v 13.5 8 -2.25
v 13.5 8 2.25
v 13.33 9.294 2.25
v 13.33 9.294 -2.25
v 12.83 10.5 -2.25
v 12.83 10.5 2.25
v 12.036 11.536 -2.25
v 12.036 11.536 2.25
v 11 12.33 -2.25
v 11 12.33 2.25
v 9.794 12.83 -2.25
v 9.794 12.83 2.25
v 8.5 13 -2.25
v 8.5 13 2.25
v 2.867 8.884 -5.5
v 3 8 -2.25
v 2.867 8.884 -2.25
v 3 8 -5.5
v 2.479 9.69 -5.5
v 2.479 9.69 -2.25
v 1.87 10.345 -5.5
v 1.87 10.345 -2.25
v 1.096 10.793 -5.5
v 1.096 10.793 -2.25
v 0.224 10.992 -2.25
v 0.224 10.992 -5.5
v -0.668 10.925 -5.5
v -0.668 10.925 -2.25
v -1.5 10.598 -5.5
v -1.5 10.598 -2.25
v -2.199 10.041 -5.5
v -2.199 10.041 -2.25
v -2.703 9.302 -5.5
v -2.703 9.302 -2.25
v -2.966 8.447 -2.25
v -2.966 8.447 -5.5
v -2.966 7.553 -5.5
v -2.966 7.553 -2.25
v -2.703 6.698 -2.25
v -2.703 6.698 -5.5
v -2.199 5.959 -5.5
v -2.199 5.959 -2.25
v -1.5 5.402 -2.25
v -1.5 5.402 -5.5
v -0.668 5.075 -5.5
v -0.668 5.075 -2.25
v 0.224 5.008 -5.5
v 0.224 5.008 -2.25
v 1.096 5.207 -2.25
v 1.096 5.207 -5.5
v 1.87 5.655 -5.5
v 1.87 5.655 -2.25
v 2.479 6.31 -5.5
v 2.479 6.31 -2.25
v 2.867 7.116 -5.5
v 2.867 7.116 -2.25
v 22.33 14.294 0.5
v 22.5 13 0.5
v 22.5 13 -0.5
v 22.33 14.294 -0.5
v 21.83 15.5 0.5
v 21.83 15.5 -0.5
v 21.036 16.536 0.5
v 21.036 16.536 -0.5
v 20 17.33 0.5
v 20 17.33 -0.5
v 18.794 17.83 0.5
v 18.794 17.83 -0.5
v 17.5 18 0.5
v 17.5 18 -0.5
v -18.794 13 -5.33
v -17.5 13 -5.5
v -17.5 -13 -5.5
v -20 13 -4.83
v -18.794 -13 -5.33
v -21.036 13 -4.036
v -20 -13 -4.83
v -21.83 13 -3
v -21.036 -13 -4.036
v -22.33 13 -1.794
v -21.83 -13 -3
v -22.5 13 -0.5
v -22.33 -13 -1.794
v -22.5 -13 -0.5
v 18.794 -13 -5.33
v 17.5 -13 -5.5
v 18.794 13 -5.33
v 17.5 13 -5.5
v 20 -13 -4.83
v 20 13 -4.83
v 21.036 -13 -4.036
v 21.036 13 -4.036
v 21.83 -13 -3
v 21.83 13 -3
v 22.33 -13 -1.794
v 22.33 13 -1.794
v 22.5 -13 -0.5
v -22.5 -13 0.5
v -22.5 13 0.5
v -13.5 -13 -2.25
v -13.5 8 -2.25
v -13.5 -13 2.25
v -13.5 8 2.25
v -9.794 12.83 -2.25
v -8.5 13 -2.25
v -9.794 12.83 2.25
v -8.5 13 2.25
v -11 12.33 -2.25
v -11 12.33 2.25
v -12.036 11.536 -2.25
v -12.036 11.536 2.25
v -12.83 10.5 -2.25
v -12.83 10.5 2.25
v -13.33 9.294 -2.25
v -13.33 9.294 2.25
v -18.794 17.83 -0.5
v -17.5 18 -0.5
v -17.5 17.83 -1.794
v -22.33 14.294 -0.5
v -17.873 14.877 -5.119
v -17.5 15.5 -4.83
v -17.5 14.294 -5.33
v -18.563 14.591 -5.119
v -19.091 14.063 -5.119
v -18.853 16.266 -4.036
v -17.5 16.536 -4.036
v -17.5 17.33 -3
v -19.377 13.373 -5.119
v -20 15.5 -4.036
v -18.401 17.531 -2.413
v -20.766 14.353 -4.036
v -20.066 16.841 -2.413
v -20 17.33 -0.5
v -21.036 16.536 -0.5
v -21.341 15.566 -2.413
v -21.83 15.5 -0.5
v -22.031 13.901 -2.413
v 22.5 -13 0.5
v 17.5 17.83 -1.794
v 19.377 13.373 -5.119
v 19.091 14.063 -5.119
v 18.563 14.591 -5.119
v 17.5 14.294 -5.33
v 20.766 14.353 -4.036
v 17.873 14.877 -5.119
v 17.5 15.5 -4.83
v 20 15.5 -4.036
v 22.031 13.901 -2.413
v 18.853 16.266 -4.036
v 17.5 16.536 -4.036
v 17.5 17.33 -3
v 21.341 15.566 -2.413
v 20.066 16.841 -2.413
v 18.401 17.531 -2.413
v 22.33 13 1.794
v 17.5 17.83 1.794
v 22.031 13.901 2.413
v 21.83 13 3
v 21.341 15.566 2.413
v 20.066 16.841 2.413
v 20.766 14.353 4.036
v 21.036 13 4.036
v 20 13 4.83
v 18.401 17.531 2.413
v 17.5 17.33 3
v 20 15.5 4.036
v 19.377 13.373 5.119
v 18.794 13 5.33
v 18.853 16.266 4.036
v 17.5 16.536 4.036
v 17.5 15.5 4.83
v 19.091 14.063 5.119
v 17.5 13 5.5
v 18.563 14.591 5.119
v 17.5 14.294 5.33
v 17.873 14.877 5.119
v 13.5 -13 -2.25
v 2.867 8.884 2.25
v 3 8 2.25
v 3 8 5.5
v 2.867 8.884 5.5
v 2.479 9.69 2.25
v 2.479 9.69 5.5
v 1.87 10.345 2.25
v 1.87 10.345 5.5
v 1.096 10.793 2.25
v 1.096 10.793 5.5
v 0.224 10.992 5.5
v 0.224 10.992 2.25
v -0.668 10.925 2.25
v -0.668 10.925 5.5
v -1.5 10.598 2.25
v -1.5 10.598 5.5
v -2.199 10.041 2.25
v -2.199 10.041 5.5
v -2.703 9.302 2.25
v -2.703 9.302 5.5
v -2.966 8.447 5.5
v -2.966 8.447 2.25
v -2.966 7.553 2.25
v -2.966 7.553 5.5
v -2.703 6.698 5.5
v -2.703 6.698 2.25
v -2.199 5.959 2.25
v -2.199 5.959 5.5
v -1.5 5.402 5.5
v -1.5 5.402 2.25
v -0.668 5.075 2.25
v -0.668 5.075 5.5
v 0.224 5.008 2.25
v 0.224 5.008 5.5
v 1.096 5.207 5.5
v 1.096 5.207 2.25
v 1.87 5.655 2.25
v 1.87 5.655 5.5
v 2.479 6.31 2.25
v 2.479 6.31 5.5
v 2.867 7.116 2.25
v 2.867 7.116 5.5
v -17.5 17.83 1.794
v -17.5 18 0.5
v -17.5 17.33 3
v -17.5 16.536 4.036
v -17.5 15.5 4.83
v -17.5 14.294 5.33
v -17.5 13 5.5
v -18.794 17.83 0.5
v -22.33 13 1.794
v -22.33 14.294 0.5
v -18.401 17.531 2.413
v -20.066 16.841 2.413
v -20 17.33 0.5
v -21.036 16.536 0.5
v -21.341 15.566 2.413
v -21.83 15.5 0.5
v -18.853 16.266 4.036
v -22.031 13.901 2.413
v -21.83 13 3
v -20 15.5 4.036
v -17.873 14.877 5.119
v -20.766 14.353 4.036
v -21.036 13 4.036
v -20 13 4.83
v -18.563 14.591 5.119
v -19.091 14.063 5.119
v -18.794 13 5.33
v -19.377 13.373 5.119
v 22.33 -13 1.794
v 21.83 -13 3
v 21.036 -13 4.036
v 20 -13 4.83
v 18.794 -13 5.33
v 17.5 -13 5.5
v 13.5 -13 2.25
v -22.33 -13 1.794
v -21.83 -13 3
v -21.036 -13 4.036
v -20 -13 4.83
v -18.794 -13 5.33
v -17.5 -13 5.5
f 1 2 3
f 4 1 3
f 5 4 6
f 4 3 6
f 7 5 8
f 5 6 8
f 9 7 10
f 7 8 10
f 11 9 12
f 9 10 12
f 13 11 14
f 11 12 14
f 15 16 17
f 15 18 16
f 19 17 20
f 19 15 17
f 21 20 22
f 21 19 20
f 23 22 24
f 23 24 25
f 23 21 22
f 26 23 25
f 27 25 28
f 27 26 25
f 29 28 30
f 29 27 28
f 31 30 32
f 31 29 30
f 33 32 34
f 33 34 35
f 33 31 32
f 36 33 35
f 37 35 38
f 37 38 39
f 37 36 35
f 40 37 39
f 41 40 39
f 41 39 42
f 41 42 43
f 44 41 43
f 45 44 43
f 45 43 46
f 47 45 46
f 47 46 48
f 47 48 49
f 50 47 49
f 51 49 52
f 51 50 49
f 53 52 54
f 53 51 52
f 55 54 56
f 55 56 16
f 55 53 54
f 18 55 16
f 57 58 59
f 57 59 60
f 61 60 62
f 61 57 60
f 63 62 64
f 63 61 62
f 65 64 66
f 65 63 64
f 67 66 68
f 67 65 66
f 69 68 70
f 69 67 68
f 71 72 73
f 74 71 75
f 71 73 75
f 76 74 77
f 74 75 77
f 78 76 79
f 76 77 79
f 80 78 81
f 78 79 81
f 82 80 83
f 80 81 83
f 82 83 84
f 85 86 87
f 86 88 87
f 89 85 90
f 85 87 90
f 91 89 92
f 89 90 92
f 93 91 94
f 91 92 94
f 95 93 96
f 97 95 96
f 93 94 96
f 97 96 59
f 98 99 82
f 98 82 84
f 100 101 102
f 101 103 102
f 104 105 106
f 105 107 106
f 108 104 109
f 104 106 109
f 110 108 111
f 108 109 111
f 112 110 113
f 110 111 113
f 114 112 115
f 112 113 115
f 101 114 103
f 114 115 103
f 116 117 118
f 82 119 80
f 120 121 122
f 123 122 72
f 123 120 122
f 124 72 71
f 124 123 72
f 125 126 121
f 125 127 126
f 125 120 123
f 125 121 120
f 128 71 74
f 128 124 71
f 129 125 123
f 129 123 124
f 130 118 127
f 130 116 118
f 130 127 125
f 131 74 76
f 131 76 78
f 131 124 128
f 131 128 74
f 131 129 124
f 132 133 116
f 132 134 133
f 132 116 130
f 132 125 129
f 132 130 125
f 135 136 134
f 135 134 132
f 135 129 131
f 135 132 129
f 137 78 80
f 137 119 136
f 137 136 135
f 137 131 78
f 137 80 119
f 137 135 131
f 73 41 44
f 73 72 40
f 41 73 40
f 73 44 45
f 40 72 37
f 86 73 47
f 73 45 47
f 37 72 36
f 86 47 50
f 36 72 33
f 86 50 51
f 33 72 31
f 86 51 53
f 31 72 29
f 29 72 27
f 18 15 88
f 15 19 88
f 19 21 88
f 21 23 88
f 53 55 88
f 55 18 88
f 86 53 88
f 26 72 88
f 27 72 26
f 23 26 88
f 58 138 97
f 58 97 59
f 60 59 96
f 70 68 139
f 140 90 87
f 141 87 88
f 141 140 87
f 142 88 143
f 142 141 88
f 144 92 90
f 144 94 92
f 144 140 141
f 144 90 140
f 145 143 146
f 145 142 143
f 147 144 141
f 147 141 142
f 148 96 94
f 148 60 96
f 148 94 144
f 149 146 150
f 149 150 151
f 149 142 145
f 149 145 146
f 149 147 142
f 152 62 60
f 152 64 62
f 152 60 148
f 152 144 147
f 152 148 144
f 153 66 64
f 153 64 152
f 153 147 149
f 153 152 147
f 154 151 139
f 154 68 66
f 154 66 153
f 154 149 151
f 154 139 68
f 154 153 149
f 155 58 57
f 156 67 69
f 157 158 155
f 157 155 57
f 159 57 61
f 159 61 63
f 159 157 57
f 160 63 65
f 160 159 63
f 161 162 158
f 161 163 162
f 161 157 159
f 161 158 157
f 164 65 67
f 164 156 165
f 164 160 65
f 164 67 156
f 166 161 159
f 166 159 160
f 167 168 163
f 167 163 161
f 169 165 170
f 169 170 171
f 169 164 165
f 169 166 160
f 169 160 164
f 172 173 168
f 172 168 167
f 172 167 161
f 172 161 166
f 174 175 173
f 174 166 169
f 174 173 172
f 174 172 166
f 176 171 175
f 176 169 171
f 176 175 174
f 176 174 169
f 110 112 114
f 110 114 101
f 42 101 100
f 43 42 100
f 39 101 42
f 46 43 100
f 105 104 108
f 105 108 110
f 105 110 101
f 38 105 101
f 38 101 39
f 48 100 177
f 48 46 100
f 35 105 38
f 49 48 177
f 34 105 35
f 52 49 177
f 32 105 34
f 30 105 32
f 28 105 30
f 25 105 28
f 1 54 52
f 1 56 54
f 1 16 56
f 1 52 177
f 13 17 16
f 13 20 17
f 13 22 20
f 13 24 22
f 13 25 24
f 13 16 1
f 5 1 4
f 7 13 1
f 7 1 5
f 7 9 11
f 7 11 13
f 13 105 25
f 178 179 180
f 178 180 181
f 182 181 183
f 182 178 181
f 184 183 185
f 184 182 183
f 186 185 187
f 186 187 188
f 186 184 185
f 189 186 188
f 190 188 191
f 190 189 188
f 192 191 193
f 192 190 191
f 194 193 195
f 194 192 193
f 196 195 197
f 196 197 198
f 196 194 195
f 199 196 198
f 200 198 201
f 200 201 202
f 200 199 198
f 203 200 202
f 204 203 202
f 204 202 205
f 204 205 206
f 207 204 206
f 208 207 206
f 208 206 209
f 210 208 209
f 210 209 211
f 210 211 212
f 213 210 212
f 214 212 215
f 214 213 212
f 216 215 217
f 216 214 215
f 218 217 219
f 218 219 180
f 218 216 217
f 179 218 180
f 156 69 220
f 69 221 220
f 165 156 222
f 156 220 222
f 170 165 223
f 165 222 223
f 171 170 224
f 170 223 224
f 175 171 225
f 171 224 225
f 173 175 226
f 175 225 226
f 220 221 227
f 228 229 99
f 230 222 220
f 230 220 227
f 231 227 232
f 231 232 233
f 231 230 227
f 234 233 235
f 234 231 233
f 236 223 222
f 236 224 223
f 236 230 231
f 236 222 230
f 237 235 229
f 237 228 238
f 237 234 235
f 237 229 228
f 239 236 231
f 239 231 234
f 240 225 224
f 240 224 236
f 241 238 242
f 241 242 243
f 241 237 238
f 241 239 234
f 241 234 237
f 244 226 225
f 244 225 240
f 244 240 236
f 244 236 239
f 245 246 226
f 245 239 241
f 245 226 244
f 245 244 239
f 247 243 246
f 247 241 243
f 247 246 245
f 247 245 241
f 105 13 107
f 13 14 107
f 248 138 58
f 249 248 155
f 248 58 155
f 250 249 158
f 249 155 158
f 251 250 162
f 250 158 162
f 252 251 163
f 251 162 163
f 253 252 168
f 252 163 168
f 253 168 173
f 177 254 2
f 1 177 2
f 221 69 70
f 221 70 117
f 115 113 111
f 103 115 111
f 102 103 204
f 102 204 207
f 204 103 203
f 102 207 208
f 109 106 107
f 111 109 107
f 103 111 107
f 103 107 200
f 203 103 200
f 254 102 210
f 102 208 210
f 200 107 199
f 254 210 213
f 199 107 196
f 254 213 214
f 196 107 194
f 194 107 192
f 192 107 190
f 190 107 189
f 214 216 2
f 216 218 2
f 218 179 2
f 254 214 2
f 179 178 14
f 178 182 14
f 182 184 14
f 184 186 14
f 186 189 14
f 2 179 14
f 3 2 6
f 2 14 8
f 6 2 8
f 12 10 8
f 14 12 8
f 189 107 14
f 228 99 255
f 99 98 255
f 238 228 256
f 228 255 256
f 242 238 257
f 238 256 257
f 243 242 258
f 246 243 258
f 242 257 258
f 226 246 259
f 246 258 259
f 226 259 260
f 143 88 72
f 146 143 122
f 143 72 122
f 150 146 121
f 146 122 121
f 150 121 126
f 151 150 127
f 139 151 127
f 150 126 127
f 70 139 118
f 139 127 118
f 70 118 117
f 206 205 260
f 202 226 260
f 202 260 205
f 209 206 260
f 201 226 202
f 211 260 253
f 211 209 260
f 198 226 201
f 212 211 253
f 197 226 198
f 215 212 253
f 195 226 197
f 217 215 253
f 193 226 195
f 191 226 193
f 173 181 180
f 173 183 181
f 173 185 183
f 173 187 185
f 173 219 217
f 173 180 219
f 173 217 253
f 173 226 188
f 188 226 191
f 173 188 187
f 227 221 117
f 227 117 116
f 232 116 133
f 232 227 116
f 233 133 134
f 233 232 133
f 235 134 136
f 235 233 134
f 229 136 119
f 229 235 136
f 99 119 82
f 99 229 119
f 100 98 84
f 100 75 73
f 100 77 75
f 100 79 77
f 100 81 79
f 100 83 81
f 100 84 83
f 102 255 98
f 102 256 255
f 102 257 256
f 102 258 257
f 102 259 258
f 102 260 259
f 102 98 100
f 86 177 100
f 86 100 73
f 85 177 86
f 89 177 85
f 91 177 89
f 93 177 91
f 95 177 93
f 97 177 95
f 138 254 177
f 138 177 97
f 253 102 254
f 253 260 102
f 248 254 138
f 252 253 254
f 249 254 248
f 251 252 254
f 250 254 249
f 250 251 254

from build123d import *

# Parameters (mm, degrees)
F1_R     = 3
F2_DEPTH = 5.5
F3_DEPTH = 2.25
F4_R     = 5


with BuildPart() as f2:
    # F1 (on Top) → F2 (new body, symmetric)
    with BuildSketch(Plane.XY):
        with BuildLine():
            Line((-22.5, -13), (-13.5, -13))
            Line((-13.5, -13), (-13.5, 8))
            ThreePointArc((-13.5, 8), (-12.0355339059, 11.5355339059), (-8.5, 13))
            Line((-8.5, 13), (8.5, 13))
            ThreePointArc((8.5, 13), (12.0355339059, 11.5355339059), (13.5, 8))
            Line((13.5, 8), (13.5, -13))
            Line((13.5, -13), (22.5, -13))
            Line((22.5, -13), (22.5, 13))
            ThreePointArc((22.5, 13), (21.0355339059, 16.5355339059), (17.5, 18))
            Line((17.5, 18), (-17.5, 18))
            ThreePointArc((-17.5, 18), (-21.0355339059, 16.5355339059), (-22.5, 13))
            Line((-22.5, 13), (-22.5, -13))
        make_face()
        with BuildLine():
            Line((-13.5, 8), (-13.5, -13))
            Line((-13.5, -13), (13.5, -13))
            Line((13.5, -13), (13.5, 8))
            ThreePointArc((13.5, 8), (12.0355339059, 11.5355339059), (8.5, 13))
            Line((8.5, 13), (-8.5, 13))
            ThreePointArc((-8.5, 13), (-12.0355339059, 11.5355339059), (-13.5, 8))
        make_face()
        with Locations((0, 8)):
            Circle(F1_R, mode=Mode.SUBTRACT)
    extrude(amount=F2_DEPTH, both=True)

    # F1 (on Top) → F3 (cut, symmetric)
    with BuildSketch(Plane.XY):
        with BuildLine():
            Line((-13.5, 8), (-13.5, -13))
            Line((-13.5, -13), (13.5, -13))
            Line((13.5, -13), (13.5, 8))
            ThreePointArc((13.5, 8), (12.0355339059, 11.5355339059), (8.5, 13))
            Line((8.5, 13), (-8.5, 13))
            ThreePointArc((-8.5, 13), (-12.0355339059, 11.5355339059), (-13.5, 8))
        make_face()
        with Locations((0, 8)):
            Circle(F1_R, mode=Mode.SUBTRACT)
    extrude(amount=F3_DEPTH, both=True, mode=Mode.SUBTRACT)

    # F4
    f4_edges = [f2.edges().sort_by_distance(p)[0] for p in [
        (-22.5, 0, 5.5),
        (-21.035534, 16.535534, 5.5),
        (0, 18, 5.5),
        (21.035534, 16.535534, 5.5),
        (22.5, 0, 5.5),
        (22.5, 0, -5.5),
    ]]
    fillet(f4_edges, radius=F4_R)


solid = f2.part
